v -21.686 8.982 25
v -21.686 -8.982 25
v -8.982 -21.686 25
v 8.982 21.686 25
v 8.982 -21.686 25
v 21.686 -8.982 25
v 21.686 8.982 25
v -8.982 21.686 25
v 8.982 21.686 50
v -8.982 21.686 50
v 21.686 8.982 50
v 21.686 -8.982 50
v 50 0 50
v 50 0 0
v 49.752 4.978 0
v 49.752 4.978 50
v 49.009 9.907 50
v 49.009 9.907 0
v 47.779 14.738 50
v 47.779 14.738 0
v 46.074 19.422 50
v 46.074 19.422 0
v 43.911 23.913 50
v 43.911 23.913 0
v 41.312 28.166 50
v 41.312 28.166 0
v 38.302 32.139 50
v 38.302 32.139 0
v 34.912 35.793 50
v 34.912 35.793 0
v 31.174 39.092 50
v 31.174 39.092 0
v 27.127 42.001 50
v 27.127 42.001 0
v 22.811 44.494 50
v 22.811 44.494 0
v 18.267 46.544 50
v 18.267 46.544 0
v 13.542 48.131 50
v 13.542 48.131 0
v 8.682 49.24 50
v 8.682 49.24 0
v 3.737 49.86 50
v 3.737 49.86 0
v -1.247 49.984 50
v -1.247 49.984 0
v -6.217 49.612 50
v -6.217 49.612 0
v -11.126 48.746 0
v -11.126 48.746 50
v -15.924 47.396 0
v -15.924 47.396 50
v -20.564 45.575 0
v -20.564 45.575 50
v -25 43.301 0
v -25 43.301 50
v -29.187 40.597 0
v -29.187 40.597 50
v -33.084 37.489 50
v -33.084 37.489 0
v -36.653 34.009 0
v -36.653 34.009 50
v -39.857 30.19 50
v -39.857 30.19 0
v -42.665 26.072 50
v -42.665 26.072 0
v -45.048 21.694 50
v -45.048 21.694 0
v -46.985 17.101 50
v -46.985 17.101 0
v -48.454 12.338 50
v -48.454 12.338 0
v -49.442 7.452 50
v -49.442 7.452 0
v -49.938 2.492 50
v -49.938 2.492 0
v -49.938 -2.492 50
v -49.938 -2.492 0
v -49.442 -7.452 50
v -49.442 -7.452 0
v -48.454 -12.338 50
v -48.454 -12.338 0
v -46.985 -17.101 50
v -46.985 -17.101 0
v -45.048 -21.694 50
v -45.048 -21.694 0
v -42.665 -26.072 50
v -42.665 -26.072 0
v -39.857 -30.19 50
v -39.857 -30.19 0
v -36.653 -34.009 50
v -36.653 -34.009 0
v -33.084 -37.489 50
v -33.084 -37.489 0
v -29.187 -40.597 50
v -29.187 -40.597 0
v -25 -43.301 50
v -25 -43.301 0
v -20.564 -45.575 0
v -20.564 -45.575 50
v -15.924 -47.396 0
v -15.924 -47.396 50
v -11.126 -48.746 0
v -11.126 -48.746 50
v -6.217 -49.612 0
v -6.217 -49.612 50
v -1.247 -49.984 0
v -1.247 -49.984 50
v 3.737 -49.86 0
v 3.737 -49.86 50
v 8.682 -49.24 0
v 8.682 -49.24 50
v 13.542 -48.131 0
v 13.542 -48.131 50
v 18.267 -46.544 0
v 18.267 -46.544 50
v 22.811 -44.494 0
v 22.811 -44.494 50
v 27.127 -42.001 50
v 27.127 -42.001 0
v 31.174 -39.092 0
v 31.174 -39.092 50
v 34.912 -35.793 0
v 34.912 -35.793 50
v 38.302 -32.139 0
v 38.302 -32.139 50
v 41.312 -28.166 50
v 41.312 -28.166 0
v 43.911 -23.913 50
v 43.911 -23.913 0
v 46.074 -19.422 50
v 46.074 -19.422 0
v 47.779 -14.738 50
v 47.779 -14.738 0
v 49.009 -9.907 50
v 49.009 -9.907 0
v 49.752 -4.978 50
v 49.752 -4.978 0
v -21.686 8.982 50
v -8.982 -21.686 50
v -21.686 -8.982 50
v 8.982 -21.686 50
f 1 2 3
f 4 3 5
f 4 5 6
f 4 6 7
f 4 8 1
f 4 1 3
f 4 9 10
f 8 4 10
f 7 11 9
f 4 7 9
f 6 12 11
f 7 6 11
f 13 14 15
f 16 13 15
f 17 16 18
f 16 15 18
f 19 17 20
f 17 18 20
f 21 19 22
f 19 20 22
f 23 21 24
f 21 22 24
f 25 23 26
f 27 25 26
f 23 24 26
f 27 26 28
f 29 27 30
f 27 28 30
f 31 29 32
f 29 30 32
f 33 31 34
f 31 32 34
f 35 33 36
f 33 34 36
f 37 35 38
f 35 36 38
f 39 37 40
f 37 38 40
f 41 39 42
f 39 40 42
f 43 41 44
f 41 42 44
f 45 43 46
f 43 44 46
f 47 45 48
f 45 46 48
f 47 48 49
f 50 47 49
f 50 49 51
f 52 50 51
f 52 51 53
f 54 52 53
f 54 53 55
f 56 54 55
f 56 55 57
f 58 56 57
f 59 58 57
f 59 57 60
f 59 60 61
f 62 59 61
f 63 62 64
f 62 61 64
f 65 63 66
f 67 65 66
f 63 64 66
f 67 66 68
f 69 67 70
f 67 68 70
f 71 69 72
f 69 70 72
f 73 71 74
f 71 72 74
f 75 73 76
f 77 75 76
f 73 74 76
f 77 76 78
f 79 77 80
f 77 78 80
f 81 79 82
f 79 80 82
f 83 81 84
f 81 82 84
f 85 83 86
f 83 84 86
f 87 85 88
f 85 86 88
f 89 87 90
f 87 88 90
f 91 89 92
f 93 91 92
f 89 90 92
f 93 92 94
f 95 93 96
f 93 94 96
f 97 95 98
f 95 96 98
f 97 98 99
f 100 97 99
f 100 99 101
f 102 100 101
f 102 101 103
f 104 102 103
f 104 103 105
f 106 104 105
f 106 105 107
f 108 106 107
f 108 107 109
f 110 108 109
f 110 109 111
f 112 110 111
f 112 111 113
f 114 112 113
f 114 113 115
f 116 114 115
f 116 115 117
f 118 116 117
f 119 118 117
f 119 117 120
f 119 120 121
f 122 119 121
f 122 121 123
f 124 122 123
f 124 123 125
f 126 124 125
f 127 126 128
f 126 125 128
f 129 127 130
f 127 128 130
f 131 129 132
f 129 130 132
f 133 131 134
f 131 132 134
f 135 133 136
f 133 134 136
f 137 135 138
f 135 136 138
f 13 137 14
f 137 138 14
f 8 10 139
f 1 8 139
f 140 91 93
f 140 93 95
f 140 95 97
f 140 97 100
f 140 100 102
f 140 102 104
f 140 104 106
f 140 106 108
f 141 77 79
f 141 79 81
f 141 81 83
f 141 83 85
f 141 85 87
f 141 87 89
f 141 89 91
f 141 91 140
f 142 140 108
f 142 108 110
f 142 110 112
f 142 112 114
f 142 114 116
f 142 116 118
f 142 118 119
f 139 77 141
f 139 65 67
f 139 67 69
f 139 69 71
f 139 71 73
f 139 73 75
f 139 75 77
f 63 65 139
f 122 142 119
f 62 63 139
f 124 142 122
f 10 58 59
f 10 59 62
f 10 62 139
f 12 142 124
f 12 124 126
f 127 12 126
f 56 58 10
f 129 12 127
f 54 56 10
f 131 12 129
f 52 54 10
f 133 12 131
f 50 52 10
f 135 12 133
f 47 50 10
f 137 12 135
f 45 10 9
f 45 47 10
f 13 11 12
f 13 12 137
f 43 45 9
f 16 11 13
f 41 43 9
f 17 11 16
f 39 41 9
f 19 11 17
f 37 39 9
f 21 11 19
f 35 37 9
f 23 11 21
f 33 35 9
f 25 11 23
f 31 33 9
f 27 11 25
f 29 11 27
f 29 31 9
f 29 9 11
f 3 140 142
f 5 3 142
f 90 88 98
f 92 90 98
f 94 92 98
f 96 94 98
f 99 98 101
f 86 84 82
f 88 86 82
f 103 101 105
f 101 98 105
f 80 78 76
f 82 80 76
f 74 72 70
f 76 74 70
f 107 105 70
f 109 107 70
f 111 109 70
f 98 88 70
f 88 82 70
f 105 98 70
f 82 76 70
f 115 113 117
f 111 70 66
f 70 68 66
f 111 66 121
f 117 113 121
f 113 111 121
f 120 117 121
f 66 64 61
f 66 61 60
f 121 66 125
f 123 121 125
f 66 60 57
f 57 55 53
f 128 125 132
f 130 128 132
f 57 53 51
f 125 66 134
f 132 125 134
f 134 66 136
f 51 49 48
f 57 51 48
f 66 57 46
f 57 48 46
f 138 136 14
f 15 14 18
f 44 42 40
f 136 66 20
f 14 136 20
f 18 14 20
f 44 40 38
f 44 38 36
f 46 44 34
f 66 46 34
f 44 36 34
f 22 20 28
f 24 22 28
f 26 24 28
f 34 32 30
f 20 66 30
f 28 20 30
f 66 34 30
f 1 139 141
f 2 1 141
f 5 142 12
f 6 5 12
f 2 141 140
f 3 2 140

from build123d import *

# Parameters (mm, degrees)
F0_R     = 50
F1_DEPTH = 50
F3_DEPTH = 25


with BuildPart() as f1:
    # F0 (on Top) → F1 (new body)
    with BuildSketch(Plane.XY):
        Circle(F0_R)
    extrude(amount=F1_DEPTH)

    # F2 (on face) → F3 (cut)
    with BuildSketch(Plane.XY.offset(50)):
        Polygon((-8.982444, -21.685537), (8.982444, -21.685537), (21.685537, -8.982444), (21.685537, 8.982444), (8.982444, 21.685537), (-8.982444, 21.685537), (-21.685537, 8.982444), (-21.685537, -8.982444), align=None)
    extrude(amount=-F3_DEPTH, mode=Mode.SUBTRACT)


solid = f1.part
